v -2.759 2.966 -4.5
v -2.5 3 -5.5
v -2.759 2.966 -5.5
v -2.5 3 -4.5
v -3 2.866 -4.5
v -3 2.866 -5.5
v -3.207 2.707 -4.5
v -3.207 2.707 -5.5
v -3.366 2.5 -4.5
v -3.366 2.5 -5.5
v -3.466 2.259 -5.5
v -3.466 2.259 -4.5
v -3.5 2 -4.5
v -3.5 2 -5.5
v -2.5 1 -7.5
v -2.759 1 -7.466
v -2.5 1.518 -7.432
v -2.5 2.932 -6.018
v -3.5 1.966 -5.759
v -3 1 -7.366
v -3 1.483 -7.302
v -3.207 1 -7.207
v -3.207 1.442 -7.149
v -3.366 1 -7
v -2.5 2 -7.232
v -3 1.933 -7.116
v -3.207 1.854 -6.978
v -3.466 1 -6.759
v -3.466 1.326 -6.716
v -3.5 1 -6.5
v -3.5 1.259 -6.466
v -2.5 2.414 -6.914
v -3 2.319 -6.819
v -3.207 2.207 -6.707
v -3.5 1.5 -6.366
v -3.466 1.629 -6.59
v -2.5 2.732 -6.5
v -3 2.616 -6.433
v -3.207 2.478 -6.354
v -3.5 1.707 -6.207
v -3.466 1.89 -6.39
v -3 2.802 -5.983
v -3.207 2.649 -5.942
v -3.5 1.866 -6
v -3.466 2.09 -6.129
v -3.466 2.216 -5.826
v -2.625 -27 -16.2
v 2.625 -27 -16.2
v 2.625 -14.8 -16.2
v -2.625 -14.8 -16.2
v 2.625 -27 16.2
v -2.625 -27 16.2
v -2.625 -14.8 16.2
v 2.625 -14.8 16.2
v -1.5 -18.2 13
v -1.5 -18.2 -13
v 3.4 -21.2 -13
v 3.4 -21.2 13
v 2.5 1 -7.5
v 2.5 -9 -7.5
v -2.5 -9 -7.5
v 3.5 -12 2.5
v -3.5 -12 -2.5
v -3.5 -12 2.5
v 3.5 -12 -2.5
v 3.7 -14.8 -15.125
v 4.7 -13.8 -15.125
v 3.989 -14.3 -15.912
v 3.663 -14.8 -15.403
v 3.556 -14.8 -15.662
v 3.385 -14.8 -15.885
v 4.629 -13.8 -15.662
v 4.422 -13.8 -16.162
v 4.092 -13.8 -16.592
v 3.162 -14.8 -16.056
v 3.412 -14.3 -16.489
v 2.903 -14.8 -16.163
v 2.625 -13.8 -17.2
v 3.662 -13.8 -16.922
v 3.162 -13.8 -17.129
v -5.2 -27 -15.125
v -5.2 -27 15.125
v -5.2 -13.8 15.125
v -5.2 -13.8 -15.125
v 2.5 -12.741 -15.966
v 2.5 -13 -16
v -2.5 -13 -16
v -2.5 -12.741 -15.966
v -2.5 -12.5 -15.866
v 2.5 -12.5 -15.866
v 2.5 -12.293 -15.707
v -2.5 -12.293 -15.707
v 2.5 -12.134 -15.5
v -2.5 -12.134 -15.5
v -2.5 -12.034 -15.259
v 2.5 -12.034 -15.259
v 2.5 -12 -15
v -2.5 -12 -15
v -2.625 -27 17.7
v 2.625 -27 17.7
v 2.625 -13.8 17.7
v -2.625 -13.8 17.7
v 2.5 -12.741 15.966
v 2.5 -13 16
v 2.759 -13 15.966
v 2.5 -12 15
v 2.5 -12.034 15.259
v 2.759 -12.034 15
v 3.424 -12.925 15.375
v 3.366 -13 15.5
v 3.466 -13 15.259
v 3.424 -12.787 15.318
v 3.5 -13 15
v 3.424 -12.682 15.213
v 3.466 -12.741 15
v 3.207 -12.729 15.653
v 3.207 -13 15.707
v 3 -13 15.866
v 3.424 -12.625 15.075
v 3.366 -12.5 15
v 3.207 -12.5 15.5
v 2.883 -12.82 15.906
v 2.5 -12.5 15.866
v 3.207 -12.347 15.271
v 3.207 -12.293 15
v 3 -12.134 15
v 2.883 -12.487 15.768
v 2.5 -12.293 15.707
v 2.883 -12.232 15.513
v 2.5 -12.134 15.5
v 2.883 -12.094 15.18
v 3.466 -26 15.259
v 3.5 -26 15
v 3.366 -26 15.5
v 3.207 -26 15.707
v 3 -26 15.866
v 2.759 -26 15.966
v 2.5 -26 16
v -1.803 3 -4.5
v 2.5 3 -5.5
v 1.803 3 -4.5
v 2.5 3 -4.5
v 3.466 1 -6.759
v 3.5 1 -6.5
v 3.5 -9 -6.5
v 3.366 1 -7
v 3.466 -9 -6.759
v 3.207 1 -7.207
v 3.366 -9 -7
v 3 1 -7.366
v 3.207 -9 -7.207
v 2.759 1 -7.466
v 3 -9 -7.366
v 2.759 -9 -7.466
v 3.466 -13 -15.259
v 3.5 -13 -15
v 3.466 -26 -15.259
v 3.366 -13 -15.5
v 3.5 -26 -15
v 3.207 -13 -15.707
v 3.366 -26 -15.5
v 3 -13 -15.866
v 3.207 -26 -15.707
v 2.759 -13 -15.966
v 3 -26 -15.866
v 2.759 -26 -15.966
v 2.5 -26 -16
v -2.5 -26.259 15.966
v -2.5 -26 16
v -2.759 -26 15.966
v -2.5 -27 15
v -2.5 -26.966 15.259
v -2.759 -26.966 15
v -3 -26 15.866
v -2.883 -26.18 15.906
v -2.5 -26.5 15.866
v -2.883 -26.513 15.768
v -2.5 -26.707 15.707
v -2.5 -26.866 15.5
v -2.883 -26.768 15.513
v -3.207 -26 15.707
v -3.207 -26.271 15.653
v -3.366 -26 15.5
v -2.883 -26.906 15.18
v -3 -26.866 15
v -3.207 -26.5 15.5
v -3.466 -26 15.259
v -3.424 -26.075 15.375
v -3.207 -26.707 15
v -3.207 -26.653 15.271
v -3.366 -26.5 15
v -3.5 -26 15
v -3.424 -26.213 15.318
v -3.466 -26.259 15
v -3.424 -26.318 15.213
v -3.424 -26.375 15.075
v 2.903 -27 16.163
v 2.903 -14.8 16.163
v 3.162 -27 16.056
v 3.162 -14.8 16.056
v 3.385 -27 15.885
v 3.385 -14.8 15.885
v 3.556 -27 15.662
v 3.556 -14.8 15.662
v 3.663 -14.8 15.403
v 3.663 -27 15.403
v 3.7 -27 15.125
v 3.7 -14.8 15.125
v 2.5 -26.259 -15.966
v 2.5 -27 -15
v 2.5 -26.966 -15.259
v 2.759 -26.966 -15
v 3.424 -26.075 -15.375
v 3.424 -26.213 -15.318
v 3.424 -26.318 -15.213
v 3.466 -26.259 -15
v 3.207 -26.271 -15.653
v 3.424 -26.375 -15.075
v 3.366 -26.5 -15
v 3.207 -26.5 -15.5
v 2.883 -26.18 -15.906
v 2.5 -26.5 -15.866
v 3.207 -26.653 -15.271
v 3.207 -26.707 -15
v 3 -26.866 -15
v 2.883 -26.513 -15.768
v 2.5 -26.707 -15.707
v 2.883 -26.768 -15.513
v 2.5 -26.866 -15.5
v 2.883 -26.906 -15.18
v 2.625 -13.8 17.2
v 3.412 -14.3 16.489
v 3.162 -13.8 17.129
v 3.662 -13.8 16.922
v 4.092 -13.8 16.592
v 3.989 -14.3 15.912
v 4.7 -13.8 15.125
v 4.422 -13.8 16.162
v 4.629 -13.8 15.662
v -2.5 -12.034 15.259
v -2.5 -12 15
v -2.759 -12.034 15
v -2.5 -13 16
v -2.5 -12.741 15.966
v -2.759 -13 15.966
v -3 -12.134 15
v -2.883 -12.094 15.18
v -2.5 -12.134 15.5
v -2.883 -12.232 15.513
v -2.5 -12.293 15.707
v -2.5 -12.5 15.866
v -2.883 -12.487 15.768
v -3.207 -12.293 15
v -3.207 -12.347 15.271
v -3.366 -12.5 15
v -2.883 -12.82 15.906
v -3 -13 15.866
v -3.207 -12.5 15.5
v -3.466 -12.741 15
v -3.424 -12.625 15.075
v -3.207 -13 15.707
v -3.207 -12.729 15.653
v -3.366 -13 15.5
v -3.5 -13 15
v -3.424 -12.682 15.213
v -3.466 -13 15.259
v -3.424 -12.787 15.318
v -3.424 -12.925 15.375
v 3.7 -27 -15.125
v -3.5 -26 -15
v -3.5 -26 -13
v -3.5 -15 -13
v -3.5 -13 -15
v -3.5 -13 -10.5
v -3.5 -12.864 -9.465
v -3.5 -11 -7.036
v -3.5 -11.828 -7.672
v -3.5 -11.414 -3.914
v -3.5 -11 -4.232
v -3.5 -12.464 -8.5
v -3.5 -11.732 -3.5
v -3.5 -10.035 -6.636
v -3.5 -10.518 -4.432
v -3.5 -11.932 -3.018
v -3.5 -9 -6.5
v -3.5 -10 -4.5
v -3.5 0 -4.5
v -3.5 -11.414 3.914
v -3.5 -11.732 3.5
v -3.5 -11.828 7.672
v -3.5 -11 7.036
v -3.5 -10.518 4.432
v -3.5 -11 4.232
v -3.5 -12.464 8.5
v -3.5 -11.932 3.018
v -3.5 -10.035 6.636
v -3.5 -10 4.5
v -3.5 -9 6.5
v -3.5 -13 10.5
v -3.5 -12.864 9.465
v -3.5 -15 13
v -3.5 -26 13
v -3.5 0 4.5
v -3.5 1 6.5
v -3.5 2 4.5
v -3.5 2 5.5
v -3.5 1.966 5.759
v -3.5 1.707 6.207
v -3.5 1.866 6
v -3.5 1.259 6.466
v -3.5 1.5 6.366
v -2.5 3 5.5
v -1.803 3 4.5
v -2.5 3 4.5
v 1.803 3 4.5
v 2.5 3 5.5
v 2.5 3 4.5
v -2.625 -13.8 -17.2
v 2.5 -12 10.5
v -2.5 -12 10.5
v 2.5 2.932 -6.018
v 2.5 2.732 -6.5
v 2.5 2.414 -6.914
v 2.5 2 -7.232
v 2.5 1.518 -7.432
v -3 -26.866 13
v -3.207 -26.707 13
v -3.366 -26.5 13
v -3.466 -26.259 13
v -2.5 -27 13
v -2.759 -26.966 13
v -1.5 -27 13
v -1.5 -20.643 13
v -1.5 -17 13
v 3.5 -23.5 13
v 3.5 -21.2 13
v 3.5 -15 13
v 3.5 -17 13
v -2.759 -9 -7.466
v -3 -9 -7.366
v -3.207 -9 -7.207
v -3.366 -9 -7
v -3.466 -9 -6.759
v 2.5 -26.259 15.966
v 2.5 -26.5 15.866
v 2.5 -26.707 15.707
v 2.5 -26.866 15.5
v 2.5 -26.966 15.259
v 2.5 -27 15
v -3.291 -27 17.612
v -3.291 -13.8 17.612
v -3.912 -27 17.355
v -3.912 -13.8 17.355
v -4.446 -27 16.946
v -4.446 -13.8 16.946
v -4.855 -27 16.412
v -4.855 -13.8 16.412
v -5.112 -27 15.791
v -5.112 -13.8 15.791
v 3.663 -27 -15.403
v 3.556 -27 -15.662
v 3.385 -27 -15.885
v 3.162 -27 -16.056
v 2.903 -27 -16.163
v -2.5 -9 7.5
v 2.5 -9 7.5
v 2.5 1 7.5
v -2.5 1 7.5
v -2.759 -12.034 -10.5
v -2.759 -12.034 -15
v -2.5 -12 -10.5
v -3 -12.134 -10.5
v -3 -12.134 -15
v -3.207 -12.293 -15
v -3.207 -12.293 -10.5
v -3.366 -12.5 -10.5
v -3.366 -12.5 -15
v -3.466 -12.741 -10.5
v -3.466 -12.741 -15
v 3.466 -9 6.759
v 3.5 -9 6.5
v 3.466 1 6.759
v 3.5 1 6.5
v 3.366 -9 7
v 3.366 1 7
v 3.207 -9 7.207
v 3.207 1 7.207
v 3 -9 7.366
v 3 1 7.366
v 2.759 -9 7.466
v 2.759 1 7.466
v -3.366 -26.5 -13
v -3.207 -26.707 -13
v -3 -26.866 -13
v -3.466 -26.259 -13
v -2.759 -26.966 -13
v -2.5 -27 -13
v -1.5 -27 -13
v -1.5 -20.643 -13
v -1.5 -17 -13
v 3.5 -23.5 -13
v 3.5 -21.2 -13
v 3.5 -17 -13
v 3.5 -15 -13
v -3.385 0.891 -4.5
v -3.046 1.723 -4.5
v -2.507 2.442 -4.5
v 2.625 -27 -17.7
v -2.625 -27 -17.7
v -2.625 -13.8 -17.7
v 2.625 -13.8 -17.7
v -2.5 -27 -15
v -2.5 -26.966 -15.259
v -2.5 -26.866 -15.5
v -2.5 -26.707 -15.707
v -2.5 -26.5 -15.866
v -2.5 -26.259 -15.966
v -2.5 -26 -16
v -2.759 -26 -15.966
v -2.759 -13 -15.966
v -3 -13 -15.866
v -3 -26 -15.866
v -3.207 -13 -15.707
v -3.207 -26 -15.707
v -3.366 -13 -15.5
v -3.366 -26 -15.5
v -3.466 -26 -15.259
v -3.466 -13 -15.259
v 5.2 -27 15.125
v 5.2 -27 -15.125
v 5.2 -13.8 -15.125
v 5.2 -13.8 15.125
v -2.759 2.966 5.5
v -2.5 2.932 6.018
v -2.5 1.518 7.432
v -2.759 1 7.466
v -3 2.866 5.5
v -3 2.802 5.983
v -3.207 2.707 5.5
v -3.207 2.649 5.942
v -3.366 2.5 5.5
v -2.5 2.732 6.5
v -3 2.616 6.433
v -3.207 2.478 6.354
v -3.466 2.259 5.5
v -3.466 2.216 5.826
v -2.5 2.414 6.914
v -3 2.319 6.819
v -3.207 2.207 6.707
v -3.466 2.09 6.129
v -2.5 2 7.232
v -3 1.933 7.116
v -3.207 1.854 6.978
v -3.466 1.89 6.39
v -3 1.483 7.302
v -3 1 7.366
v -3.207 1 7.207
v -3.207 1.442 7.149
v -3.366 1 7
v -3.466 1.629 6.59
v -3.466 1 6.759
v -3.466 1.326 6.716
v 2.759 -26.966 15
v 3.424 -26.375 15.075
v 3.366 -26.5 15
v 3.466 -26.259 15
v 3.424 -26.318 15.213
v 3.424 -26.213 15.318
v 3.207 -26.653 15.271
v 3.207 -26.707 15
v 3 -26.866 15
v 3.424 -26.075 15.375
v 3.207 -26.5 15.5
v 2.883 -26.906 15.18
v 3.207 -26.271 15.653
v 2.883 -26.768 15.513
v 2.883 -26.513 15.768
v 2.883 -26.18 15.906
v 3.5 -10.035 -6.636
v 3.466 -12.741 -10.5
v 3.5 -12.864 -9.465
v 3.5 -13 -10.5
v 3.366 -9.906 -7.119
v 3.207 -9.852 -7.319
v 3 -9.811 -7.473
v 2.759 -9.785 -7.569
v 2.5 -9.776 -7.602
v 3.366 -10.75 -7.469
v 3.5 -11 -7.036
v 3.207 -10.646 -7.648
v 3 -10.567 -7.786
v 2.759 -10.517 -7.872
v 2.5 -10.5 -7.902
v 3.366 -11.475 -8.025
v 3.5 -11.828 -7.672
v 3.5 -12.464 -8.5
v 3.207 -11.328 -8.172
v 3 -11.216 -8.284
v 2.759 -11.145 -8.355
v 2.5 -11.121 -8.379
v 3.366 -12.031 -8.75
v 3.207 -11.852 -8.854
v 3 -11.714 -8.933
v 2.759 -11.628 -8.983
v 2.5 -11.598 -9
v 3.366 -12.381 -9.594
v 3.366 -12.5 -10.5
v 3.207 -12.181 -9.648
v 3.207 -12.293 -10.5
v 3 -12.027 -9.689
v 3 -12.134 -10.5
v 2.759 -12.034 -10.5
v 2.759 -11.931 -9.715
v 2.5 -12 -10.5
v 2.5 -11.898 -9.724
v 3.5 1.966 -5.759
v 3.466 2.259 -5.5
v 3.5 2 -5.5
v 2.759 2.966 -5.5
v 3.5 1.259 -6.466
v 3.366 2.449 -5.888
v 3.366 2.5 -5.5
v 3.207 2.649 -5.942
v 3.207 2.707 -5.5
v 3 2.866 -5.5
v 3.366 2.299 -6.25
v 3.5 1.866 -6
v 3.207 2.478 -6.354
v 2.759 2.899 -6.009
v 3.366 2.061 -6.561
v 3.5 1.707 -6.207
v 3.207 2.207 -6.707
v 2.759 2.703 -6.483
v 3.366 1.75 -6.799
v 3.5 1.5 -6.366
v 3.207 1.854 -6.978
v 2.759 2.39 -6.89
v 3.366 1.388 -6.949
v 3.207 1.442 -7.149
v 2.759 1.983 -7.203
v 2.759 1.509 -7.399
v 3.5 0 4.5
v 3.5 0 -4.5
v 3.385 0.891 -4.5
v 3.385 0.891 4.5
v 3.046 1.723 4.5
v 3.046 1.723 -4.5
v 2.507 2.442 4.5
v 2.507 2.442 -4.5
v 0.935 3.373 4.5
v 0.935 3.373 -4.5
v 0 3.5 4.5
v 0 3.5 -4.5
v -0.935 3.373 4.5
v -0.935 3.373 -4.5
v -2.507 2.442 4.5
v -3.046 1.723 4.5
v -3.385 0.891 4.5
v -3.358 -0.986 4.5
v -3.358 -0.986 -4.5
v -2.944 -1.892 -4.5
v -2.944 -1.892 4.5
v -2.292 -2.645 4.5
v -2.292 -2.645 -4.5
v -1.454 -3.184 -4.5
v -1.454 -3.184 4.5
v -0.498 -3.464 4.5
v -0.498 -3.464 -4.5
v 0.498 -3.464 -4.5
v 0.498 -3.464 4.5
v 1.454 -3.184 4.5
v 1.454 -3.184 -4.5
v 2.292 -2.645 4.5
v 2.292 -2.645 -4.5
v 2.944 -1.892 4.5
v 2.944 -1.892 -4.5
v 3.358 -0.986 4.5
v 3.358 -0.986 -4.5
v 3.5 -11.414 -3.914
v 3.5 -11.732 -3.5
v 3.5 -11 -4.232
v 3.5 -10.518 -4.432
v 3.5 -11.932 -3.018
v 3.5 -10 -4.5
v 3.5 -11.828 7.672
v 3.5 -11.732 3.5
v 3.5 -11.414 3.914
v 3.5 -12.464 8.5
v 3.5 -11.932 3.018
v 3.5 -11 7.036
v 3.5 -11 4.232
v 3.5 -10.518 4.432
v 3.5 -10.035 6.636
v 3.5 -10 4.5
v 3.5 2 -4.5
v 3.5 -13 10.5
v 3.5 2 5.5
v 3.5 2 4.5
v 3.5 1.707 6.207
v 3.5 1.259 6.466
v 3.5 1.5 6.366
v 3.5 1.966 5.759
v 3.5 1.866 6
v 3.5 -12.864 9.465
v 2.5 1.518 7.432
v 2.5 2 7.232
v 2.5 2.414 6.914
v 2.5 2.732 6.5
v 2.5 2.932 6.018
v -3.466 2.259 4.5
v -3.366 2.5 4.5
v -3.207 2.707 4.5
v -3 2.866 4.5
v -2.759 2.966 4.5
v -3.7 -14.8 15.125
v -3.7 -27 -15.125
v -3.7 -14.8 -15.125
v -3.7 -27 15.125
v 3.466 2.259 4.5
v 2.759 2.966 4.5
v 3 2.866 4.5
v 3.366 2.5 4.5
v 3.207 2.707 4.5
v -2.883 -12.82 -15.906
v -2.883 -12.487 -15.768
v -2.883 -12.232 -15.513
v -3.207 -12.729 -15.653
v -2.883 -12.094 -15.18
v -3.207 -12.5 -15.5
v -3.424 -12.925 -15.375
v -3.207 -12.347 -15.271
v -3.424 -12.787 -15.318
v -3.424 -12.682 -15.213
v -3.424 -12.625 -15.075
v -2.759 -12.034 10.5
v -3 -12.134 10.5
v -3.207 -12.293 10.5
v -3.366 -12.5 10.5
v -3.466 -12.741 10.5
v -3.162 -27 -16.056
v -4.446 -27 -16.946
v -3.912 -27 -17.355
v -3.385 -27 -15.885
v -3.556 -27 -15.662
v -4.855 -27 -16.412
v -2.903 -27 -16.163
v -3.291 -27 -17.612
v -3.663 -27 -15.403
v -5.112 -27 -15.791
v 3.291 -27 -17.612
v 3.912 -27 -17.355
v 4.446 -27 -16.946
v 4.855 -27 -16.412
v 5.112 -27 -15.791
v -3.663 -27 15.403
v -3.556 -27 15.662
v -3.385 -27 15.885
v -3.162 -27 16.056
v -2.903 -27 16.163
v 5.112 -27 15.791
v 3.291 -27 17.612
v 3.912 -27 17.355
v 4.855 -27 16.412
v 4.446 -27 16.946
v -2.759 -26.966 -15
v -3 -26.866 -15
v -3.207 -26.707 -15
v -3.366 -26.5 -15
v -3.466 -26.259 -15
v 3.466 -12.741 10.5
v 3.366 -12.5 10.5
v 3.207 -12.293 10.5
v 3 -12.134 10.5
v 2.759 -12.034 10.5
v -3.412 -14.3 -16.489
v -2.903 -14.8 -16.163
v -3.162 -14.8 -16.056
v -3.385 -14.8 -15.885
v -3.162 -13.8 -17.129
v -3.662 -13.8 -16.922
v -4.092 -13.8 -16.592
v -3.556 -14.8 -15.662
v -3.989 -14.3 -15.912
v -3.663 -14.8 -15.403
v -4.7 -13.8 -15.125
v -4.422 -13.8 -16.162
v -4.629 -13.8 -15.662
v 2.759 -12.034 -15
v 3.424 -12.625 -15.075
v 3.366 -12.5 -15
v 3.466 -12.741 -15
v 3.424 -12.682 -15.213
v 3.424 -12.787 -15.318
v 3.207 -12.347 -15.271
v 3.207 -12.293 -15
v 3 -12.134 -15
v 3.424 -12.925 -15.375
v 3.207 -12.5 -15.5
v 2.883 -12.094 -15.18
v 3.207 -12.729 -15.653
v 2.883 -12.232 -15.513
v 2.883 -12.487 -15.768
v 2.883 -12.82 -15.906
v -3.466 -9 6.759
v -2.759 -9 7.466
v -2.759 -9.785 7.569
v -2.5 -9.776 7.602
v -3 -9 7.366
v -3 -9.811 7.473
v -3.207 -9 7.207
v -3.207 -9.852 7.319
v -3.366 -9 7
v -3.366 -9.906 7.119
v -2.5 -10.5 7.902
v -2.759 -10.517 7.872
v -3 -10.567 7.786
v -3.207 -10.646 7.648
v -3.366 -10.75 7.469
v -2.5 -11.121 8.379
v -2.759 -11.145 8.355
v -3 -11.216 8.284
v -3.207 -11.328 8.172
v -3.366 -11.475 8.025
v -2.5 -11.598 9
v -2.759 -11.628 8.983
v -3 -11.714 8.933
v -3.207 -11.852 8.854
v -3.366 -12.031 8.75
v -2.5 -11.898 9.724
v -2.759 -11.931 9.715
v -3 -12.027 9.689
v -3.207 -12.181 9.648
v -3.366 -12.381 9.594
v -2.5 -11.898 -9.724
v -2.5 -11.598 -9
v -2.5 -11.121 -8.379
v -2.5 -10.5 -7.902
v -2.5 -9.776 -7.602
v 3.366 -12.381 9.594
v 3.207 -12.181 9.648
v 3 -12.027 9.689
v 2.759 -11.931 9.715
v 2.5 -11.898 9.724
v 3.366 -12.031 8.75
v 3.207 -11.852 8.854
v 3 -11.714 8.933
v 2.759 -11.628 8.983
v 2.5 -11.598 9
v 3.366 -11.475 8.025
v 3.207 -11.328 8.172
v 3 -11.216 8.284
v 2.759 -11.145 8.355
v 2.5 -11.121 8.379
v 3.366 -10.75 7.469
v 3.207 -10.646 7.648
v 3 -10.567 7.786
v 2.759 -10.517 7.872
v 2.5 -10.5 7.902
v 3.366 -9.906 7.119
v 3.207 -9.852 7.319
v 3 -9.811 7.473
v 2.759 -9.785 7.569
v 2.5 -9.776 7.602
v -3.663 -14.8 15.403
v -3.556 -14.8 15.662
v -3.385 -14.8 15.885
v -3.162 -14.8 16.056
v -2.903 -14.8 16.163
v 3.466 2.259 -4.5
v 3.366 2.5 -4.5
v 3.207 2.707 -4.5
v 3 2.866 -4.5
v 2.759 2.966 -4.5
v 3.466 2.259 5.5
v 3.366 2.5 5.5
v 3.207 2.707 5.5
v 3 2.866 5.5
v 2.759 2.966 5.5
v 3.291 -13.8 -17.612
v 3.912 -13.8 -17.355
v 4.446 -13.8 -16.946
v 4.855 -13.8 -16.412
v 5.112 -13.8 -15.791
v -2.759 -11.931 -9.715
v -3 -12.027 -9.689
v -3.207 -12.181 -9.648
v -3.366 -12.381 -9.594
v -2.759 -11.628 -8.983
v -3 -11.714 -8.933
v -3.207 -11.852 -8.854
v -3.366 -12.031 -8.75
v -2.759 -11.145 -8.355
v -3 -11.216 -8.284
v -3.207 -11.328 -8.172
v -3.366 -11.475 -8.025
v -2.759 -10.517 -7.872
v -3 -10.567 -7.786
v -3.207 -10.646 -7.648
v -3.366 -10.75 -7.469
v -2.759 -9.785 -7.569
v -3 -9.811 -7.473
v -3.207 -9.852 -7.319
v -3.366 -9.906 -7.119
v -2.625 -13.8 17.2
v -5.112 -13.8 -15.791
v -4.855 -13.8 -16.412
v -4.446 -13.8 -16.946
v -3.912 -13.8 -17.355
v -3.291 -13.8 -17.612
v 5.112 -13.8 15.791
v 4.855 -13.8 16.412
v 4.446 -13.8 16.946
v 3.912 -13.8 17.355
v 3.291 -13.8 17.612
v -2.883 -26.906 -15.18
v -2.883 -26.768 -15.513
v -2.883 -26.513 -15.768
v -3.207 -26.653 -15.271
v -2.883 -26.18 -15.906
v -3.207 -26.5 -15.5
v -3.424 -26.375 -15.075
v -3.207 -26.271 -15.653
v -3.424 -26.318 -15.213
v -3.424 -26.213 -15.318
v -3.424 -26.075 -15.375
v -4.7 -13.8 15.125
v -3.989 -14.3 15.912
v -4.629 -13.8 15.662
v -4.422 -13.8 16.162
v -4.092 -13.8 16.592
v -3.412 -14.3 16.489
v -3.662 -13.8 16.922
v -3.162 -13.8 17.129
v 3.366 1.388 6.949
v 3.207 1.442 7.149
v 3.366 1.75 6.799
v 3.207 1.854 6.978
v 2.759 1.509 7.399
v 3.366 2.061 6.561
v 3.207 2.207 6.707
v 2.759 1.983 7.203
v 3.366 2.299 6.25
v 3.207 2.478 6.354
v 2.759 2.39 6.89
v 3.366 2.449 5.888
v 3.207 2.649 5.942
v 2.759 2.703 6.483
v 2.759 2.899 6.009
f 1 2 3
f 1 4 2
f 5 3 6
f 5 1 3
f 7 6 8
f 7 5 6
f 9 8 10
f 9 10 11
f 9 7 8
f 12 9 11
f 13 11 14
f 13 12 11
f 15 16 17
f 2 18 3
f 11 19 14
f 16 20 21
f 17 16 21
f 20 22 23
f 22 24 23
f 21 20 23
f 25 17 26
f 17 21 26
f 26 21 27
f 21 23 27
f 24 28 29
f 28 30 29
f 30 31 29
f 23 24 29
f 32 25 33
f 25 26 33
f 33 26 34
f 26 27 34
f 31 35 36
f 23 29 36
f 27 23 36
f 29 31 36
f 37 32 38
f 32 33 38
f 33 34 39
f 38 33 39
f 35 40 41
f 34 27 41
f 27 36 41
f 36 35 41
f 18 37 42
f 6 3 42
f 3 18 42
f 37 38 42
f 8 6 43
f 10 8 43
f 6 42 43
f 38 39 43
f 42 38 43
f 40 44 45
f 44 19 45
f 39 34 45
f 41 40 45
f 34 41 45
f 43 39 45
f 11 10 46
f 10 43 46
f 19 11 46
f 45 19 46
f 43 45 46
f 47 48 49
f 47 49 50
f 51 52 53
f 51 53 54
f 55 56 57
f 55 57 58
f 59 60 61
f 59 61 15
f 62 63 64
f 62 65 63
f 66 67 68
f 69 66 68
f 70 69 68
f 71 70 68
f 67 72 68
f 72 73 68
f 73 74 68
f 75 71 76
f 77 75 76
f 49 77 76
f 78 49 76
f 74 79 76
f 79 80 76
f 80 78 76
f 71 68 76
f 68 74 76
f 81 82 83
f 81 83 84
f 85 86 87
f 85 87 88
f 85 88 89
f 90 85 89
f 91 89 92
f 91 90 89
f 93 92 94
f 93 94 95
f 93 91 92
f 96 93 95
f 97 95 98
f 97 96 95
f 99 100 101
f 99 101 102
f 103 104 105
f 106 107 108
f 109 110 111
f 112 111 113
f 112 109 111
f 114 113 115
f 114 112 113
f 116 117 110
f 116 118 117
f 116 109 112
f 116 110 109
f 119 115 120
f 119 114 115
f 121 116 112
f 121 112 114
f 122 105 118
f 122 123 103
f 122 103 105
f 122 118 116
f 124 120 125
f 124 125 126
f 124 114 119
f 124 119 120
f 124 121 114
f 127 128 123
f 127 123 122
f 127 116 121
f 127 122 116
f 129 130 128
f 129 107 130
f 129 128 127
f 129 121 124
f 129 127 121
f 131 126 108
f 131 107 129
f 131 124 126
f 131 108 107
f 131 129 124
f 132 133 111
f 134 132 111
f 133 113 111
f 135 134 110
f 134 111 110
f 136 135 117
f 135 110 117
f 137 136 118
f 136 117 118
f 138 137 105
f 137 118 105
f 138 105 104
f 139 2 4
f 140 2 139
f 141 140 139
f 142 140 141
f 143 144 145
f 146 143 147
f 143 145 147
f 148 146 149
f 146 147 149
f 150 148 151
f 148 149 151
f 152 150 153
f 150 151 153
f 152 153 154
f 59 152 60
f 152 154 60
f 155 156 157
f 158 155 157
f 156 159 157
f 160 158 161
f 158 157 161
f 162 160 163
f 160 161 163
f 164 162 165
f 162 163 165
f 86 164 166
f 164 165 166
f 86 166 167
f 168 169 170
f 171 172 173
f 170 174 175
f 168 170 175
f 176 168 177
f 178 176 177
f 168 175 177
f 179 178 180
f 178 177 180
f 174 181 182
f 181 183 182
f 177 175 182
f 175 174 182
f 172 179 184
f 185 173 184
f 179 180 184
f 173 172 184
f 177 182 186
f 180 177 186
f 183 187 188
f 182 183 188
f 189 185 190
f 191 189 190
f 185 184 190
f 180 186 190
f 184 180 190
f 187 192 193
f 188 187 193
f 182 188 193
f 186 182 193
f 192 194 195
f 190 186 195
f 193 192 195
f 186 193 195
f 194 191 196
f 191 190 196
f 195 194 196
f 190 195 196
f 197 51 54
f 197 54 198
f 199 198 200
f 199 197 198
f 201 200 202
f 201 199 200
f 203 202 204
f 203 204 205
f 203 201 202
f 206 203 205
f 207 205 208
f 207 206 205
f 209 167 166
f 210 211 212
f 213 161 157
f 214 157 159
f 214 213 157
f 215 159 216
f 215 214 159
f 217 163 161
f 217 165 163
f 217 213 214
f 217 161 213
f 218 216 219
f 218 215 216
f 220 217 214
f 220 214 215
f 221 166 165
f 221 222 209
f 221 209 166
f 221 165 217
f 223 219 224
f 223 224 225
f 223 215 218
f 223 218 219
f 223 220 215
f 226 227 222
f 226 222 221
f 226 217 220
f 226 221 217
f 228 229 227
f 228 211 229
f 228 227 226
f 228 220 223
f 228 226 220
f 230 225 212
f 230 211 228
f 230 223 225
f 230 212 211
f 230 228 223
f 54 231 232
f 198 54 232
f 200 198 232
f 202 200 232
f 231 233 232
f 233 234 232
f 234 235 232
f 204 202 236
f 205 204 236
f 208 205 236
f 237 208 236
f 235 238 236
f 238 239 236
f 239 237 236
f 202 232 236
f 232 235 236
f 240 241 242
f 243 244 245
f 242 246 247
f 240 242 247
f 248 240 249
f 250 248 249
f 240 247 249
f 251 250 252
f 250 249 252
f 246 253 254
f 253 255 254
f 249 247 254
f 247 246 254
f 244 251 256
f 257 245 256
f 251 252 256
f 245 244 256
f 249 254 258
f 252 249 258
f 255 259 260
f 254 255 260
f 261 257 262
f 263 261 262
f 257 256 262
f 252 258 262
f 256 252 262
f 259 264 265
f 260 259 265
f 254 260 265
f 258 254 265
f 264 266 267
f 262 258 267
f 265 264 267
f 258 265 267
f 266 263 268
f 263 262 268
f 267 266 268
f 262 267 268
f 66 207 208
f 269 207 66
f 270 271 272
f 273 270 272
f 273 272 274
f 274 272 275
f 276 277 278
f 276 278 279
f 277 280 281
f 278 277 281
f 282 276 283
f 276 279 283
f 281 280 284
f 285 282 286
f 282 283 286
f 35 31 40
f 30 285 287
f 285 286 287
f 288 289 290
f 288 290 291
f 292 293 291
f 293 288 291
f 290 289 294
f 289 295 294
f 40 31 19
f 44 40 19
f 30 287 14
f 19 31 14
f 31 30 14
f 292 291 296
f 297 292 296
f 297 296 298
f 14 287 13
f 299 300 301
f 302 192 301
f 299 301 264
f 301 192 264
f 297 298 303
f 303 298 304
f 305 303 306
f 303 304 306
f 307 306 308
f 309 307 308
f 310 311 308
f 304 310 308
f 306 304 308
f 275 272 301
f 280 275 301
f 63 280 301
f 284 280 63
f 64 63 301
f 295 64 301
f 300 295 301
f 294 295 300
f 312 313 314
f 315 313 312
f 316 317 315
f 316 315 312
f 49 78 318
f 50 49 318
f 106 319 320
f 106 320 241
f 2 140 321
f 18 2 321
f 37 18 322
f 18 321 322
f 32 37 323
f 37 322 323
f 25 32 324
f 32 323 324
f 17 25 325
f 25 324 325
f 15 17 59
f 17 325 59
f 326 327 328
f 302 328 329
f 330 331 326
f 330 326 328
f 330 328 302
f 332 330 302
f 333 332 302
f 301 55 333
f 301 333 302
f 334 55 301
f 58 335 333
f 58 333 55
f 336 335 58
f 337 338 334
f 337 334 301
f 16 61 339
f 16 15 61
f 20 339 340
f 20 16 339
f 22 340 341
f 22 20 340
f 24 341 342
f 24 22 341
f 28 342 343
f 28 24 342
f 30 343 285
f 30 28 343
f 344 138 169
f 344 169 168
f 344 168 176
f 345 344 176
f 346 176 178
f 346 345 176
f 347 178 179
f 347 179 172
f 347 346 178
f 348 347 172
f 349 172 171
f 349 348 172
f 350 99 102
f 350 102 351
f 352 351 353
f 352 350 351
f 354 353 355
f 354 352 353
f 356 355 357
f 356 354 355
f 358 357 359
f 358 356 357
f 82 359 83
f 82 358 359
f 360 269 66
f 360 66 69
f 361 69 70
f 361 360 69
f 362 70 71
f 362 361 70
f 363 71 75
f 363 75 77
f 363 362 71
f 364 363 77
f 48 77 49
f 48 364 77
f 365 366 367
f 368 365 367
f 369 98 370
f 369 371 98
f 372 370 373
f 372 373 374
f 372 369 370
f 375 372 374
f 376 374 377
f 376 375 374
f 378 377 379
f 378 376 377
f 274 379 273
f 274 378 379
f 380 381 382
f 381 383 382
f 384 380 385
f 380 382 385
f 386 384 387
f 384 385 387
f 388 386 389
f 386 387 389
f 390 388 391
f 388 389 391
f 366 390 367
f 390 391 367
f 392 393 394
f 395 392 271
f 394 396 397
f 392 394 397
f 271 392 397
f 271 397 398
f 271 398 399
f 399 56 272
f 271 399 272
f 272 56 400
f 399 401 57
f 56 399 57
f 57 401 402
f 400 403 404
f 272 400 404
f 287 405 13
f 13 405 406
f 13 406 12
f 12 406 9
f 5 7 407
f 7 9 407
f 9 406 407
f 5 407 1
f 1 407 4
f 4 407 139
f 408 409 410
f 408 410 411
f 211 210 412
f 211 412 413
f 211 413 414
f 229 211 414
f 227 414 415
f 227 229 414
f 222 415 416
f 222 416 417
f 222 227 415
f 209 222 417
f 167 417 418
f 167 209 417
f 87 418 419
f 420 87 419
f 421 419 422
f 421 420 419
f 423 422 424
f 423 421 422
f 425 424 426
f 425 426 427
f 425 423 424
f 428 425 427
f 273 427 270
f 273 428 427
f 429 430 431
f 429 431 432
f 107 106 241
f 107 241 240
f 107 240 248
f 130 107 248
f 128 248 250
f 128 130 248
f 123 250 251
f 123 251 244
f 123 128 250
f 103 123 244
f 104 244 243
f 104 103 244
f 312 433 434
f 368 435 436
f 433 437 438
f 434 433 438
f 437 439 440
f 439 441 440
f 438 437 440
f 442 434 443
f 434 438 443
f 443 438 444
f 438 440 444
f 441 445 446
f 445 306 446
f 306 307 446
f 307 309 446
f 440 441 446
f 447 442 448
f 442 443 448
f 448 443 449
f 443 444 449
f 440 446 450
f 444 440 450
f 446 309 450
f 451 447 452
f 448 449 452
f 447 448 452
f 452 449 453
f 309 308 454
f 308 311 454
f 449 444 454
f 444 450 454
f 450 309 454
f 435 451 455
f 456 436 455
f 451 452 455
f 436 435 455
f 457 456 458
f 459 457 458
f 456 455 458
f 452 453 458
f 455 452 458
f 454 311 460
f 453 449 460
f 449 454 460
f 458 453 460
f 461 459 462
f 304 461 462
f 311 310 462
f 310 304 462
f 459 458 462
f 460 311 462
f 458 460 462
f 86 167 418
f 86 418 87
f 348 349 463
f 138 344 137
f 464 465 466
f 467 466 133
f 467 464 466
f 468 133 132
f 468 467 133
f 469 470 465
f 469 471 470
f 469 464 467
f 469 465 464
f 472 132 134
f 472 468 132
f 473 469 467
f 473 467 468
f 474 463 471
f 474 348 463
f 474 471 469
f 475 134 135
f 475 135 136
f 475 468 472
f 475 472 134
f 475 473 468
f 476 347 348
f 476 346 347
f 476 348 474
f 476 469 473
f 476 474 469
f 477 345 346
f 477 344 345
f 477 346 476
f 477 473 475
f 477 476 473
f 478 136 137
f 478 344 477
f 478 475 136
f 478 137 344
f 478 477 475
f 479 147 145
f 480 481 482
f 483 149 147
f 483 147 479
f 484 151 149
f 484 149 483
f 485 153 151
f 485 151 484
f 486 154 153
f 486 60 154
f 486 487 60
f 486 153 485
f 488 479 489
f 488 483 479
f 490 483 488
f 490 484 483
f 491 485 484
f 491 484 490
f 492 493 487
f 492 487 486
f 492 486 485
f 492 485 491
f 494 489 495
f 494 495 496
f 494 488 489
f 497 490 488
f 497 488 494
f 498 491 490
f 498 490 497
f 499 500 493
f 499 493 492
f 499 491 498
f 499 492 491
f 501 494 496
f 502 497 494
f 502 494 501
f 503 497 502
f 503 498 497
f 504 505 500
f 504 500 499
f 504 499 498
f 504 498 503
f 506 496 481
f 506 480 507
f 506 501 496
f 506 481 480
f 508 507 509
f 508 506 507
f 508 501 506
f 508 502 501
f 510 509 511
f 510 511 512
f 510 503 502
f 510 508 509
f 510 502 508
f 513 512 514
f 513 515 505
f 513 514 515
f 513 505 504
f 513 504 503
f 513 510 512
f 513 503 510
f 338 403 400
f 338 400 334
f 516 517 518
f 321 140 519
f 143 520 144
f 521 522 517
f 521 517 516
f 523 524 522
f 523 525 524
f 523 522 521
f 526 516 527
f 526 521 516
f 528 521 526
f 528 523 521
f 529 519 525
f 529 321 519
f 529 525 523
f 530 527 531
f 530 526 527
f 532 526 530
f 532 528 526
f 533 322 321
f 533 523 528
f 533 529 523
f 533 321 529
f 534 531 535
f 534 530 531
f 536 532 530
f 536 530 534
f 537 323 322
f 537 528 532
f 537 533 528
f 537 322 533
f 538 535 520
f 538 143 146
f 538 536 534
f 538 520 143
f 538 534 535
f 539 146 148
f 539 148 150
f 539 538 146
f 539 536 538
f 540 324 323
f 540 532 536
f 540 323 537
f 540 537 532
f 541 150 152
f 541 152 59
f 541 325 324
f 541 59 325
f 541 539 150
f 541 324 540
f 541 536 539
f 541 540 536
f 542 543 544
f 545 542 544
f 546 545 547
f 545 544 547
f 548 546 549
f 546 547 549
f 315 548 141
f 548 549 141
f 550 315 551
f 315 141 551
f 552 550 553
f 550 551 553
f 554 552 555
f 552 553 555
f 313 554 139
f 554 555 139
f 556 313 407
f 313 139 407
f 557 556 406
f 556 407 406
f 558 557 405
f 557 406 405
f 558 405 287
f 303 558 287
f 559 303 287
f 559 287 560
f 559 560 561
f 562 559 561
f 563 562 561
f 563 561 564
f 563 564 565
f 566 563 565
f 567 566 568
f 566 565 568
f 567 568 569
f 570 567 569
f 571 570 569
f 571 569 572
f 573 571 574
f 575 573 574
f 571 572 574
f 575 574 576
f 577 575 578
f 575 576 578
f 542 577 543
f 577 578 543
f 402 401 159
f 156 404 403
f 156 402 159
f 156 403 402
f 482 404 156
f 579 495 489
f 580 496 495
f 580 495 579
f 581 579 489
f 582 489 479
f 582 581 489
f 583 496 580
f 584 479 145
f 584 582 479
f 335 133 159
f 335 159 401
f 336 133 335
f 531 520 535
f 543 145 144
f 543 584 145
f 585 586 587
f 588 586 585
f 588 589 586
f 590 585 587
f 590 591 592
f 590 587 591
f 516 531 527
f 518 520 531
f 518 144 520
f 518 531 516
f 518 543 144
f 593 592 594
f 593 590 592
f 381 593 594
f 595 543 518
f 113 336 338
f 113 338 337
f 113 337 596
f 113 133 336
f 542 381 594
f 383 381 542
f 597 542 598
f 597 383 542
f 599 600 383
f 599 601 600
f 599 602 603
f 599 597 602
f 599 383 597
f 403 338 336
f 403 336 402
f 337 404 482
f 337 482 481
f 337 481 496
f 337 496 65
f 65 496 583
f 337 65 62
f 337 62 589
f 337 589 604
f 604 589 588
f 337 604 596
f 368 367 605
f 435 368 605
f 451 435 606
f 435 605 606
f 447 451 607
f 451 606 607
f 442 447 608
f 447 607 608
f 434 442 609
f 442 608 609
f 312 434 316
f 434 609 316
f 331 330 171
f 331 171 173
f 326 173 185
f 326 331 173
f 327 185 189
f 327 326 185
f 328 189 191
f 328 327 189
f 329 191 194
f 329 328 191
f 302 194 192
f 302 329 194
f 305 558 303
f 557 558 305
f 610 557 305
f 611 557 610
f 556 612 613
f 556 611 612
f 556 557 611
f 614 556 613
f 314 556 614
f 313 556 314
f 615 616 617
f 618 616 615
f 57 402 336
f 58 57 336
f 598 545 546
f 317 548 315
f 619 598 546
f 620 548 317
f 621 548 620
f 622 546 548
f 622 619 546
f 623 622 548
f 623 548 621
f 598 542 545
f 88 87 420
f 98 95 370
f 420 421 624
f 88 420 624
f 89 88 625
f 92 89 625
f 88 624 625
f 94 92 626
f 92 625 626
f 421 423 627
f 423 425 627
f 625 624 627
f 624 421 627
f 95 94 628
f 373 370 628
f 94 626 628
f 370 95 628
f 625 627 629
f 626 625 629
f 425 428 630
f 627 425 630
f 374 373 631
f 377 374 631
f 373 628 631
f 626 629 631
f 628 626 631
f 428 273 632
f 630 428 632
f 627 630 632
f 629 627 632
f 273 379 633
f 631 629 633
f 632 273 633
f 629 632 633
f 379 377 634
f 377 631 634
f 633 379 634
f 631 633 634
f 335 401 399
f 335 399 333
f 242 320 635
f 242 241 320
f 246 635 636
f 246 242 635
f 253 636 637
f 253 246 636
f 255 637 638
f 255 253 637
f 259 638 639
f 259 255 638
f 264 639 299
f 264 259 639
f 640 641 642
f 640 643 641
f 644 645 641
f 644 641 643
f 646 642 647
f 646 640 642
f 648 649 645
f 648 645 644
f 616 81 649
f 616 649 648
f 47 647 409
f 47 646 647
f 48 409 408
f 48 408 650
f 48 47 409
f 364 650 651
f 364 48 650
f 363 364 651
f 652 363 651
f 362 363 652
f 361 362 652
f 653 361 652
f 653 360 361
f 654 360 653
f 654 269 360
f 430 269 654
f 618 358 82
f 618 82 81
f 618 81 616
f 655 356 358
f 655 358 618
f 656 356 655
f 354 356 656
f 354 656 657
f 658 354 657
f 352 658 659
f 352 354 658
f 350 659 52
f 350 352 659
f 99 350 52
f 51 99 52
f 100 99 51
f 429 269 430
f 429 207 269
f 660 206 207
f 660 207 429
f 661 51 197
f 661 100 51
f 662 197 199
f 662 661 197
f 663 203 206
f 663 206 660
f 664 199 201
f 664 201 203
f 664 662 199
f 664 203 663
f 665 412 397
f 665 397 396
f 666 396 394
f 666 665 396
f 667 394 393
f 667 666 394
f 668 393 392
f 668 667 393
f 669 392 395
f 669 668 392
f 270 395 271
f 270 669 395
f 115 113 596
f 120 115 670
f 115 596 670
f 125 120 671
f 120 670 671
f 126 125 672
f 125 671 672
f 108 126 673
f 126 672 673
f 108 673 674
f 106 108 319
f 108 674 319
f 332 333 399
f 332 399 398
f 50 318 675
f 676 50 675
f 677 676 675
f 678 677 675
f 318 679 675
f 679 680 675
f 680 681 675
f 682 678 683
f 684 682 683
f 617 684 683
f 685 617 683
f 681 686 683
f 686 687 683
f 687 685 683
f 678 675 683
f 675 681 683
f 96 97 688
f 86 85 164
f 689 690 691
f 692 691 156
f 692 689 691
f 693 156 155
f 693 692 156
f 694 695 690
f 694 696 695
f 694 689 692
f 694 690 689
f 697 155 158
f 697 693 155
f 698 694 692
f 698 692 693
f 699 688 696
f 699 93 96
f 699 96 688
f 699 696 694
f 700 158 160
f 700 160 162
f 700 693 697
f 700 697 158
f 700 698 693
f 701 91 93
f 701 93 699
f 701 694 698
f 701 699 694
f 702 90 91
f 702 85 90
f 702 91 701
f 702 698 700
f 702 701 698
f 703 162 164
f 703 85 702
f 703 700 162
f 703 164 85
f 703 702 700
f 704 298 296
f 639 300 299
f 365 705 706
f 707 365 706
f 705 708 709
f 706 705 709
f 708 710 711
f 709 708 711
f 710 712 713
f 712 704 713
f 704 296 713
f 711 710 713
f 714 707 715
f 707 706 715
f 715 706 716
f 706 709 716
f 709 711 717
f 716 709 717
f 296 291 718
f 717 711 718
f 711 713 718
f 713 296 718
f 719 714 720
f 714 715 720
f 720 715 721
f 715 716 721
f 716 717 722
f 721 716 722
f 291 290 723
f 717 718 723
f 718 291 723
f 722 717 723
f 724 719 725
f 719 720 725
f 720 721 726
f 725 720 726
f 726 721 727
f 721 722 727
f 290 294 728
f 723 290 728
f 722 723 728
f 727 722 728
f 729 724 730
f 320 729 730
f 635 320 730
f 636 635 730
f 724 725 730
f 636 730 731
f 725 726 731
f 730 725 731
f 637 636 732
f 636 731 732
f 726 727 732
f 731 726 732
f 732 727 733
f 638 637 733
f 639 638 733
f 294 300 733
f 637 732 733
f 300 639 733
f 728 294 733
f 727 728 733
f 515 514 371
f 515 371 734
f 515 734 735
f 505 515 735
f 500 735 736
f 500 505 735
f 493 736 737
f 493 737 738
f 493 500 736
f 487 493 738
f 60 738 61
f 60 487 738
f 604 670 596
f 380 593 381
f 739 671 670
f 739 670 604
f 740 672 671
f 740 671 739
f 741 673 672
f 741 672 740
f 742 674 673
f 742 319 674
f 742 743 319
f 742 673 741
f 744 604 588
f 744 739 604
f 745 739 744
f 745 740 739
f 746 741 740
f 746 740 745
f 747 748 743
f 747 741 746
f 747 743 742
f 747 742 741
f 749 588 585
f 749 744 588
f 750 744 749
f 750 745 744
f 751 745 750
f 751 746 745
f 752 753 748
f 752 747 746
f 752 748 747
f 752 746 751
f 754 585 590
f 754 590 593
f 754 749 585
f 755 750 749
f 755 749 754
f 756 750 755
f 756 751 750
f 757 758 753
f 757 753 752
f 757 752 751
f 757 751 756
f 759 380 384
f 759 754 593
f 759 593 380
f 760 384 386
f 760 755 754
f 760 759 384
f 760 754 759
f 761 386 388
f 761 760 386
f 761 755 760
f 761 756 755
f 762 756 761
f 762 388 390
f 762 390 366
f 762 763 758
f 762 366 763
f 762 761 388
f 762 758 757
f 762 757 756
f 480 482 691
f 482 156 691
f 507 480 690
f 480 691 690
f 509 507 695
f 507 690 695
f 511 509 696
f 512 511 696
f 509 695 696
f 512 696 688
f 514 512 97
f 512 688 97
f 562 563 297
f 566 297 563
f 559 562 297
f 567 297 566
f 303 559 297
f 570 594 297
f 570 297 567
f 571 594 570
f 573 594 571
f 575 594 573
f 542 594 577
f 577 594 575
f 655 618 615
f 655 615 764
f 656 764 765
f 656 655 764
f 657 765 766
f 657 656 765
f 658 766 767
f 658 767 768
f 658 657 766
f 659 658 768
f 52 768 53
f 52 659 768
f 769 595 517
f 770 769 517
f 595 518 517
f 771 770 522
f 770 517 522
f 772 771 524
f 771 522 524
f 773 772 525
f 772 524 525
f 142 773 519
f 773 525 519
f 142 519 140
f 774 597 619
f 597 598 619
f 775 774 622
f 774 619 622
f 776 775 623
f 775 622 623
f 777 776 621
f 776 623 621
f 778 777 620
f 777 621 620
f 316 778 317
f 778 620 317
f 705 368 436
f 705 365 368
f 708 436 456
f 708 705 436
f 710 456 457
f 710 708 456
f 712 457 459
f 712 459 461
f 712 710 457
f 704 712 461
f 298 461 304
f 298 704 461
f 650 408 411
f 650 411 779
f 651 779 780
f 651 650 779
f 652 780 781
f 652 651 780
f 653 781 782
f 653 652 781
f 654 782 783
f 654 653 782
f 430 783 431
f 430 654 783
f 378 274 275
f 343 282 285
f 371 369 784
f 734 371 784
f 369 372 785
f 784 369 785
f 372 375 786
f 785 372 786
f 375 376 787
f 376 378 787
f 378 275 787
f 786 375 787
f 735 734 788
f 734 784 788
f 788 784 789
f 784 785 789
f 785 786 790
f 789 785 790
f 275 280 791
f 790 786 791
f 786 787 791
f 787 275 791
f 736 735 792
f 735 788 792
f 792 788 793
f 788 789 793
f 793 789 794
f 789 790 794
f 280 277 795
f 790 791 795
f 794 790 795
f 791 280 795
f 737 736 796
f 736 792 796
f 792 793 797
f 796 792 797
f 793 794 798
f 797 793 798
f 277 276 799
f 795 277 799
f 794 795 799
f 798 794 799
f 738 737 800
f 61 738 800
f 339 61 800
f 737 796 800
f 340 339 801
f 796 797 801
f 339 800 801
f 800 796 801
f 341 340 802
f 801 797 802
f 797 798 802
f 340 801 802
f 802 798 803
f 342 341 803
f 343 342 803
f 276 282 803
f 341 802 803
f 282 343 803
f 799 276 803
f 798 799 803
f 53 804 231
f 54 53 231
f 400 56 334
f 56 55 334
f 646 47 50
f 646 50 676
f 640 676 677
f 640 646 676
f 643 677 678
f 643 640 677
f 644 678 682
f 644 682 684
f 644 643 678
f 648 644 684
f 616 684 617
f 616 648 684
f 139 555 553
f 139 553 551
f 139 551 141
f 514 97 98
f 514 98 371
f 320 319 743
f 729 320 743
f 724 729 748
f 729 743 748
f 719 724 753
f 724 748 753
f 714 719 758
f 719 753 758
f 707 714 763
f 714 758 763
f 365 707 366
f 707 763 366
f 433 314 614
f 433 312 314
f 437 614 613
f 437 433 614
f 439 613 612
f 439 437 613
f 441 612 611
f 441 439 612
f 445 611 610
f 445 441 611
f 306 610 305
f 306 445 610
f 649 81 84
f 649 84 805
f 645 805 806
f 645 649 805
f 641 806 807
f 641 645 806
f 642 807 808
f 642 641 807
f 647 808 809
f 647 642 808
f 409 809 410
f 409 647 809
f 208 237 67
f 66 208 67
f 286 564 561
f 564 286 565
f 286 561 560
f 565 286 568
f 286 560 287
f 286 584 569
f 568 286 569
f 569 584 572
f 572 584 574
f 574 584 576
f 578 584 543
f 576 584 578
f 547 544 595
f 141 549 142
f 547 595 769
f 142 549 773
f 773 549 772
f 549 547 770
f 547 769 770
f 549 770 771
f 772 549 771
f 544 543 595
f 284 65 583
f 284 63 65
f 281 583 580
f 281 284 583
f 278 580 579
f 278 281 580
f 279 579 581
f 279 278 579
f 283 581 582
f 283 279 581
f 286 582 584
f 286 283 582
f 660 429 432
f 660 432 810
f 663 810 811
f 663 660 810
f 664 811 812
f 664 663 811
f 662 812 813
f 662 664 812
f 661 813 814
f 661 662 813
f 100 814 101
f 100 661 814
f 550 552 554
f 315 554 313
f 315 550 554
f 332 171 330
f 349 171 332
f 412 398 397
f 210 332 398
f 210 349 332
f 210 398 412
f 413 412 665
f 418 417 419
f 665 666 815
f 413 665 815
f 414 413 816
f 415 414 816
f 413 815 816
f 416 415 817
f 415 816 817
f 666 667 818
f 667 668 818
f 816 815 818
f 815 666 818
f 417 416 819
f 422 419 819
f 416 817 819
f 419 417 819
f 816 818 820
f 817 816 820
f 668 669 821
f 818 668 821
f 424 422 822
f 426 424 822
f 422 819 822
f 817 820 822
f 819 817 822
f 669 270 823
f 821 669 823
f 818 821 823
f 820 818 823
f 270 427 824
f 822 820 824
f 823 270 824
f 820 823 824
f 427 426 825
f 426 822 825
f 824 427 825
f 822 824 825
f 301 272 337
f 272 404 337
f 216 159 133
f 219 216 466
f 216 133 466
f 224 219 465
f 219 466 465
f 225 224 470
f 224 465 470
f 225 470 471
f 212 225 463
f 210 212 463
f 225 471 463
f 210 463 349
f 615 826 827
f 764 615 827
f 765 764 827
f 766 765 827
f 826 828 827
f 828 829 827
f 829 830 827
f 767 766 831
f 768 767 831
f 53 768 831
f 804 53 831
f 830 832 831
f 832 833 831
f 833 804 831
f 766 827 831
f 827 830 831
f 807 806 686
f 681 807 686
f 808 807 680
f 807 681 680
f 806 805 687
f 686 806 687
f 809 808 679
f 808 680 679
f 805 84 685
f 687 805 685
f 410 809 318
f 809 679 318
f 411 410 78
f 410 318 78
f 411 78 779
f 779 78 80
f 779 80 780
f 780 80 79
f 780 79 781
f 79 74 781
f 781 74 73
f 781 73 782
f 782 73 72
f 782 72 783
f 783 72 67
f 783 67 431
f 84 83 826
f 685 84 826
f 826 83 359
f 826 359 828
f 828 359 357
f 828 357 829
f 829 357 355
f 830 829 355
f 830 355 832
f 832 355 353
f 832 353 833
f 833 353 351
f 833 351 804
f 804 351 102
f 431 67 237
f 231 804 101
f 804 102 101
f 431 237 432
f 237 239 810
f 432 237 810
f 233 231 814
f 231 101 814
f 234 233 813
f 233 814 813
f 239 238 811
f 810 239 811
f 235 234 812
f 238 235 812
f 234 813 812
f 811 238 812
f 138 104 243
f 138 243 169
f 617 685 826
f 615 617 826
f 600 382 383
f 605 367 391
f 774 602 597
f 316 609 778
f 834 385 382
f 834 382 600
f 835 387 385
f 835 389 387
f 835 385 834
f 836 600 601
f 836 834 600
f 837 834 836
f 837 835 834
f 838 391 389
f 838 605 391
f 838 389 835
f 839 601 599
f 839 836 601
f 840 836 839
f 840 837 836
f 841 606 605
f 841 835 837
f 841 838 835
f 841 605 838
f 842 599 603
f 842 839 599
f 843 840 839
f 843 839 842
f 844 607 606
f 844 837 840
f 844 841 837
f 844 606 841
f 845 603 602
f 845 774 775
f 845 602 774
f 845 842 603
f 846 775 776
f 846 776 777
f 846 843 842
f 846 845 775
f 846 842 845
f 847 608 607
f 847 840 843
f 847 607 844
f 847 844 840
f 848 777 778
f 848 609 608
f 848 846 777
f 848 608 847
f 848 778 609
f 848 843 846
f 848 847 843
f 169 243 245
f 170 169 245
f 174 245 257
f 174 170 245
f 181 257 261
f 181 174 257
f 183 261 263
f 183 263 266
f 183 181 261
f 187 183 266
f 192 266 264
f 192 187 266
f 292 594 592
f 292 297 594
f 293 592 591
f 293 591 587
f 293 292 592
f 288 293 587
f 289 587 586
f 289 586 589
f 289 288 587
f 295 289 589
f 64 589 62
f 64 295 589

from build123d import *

# Parameters (mm, degrees)
F0_W      = 15
F0_H      = 3
F0_W_2    = 4.5
F0_H_2    = 26
F1_DEPTH  = 3.5
F2_R      = 3.5
F3_DEPTH  = 9
F4_R      = 1
F5_R      = 3
F6_R      = 2
F7_R      = 1
F8_SIZE2  = 3.99999
F8_SIZE   = 6.99999
F9_W      = 4.2
F9_H      = 26
F10_DEPTH = 5
F11_SIZE2 = 3
F11_SIZE  = 4.9
F12_W     = 7.5
F12_H     = 26
F13_DEPTH = 2
F16_DEPTH = 13.2
F17_SIZE  = 1


# Not quite as in the source:
# - a fillet or chamfer is up to 0.001 mm smaller than in the source, because OpenCascade refuses the exact size


with BuildPart() as f1:
    # F0 (on Right) → F1 (new body, symmetric)
    with BuildSketch(Plane.YZ):
        with Locations((-4.5, 6)):
            Rectangle(F0_W, F0_H)
        Polygon((-12, -4.5), (-12, 4.5), (-12, 7.5), (-12, 16), (-27, 16), (-27, -16), (-12, -16), (-12, -7.5), align=None)
        with Locations((-17.25, 0)):
            Rectangle(F0_W_2, F0_H_2, mode=Mode.SUBTRACT)
        with Locations((-4.5, -6)):
            Rectangle(F0_W, F0_H)
    extrude(amount=F1_DEPTH, both=True)

    # F2 (on face) → F3 (join, through all)
    with BuildSketch(Plane.XY.offset(-4.5)):
        Circle(F2_R)
    extrude(amount=F3_DEPTH)

    # F4
    f4_edges = [f1.edges().sort_by_distance(p)[0] for p in [
        (0, -12, 16),
        (0, -12, -16),
        (0, -27, 16),
        (0, -27, -16),
    ]]
    fillet(f4_edges, radius=F4_R)

    # F5
    f5_edges = [f1.edges().sort_by_distance(p)[0] for p in [
        (0, -12, 7.5),
        (0, -12, -7.5),
    ]]
    fillet(f5_edges, radius=F5_R)

    # F6
    f6_edges = [f1.edges().sort_by_distance(p)[0] for p in [
        (0, 3, 7.5),
        (0, 3, -7.5),
        (0, -12, -4.5),
        (0, -12, 4.5),
    ]]
    fillet(f6_edges, radius=F6_R)

    # F7
    f7_edges = [f1.edges().sort_by_distance(p)[0] for p in [
        (3.5, 2.414214, 6.914214),
        (3.5, 2.414214, -6.914214),
        (-3.5, -19.5, -16),
        (-3.5, -19.5, 16),
    ]]
    fillet(f7_edges, radius=F7_R)

    # F8 (size 7 and 4 in the source; OpenCascade refuses exactly that, so slightly less here)
    f8_edges = [f1.edges().sort_by_distance(p)[0] for p in [
        (3.5, -19.5, 0),
    ]]
    f8_side = f1.faces().sort_by_distance((0, -19.5, 0))[0]
    chamfer(f8_edges, length=F8_SIZE, length2=F8_SIZE2, reference=f8_side)

    # F12 (on face) → F13 (cut)
    with BuildSketch(Plane(origin=(-3.5, 0, 0), x_dir=(0, -1, 0), z_dir=(-1, 0, 0))):
        with Locations((23.25, 0)):
            Rectangle(F12_W, F12_H)
    extrude(amount=-F13_DEPTH, mode=Mode.SUBTRACT)


with BuildPart() as f10:
    # F9 (on face) → F10 (new body)
    with BuildSketch(Plane.YZ.offset(3.5)):
        with Locations((-19.1, 0)):
            Rectangle(F9_W, F9_H)
    extrude(amount=-F10_DEPTH)

    # F11
    f11_edges = [f10.edges().sort_by_distance(p)[0] for p in [
        (-1.5, -21.2, 0),
    ]]
    f11_side = f10.faces().sort_by_distance((1, -21.2, 0))[0]
    chamfer(f11_edges, length=F11_SIZE, length2=F11_SIZE2, reference=f11_side)


with BuildPart() as f1_1:
    add(f1.part)

    # F14: union F10
    add(f10.part)


with BuildPart() as f16:
    # F15 (on face) → F16 (new body)
    with BuildSketch(Plane.XZ.offset(27)):
        with BuildLine():
            Line((2.6246717919, 17.7), (-2.6246717919, 17.7))
            ThreePointArc((-2.6246717919, 17.7), (-4.4457038316, 16.9457038316), (-5.2, 15.1246717919))
            Line((-5.2, 15.1246717919), (-5.2, -15.1246717919))
            ThreePointArc((-5.2, -15.1246717919), (-4.4457038316, -16.9457038316), (-2.6246717919, -17.7))
            Line((-2.6246717919, -17.7), (2.6246717919, -17.7))
            ThreePointArc((2.6246717919, -17.7), (4.4457038316, -16.9457038316), (5.2, -15.1246717919))
            Line((5.2, -15.1246717919), (5.2, 15.1246717919))
            ThreePointArc((5.2, 15.1246717919), (4.4457038316, 16.9457038316), (2.6246717919, 17.7))
        make_face()
        with BuildLine():
            Line((-2.6246717919, 16.2), (2.6246717919, 16.2))
            ThreePointArc((2.6246717919, 16.2), (3.3850436598, 15.8850436598), (3.7, 15.1246717919))
            Line((3.7, 15.1246717919), (3.7, -15.1246717919))
            ThreePointArc((3.7, -15.1246717919), (3.3850436598, -15.8850436598), (2.6246717919, -16.2))
            Line((2.6246717919, -16.2), (-2.6246717919, -16.2))
            ThreePointArc((-2.6246717919, -16.2), (-3.3850436598, -15.8850436598), (-3.7, -15.1246717919))
            Line((-3.7, -15.1246717919), (-3.7, 15.1246717919))
            ThreePointArc((-3.7, 15.1246717919), (-3.3850436598, 15.8850436598), (-2.6246717919, 16.2))
        make_face(mode=Mode.SUBTRACT)
    extrude(amount=-F16_DEPTH)

    # F17
    f17_edges = [f16.edges().sort_by_distance(p)[0] for p in [
        (-3.7, -13.8, 0),
    ]]
    chamfer(f17_edges, length=F17_SIZE)


solid = Compound([f1_1.part, f16.part])
